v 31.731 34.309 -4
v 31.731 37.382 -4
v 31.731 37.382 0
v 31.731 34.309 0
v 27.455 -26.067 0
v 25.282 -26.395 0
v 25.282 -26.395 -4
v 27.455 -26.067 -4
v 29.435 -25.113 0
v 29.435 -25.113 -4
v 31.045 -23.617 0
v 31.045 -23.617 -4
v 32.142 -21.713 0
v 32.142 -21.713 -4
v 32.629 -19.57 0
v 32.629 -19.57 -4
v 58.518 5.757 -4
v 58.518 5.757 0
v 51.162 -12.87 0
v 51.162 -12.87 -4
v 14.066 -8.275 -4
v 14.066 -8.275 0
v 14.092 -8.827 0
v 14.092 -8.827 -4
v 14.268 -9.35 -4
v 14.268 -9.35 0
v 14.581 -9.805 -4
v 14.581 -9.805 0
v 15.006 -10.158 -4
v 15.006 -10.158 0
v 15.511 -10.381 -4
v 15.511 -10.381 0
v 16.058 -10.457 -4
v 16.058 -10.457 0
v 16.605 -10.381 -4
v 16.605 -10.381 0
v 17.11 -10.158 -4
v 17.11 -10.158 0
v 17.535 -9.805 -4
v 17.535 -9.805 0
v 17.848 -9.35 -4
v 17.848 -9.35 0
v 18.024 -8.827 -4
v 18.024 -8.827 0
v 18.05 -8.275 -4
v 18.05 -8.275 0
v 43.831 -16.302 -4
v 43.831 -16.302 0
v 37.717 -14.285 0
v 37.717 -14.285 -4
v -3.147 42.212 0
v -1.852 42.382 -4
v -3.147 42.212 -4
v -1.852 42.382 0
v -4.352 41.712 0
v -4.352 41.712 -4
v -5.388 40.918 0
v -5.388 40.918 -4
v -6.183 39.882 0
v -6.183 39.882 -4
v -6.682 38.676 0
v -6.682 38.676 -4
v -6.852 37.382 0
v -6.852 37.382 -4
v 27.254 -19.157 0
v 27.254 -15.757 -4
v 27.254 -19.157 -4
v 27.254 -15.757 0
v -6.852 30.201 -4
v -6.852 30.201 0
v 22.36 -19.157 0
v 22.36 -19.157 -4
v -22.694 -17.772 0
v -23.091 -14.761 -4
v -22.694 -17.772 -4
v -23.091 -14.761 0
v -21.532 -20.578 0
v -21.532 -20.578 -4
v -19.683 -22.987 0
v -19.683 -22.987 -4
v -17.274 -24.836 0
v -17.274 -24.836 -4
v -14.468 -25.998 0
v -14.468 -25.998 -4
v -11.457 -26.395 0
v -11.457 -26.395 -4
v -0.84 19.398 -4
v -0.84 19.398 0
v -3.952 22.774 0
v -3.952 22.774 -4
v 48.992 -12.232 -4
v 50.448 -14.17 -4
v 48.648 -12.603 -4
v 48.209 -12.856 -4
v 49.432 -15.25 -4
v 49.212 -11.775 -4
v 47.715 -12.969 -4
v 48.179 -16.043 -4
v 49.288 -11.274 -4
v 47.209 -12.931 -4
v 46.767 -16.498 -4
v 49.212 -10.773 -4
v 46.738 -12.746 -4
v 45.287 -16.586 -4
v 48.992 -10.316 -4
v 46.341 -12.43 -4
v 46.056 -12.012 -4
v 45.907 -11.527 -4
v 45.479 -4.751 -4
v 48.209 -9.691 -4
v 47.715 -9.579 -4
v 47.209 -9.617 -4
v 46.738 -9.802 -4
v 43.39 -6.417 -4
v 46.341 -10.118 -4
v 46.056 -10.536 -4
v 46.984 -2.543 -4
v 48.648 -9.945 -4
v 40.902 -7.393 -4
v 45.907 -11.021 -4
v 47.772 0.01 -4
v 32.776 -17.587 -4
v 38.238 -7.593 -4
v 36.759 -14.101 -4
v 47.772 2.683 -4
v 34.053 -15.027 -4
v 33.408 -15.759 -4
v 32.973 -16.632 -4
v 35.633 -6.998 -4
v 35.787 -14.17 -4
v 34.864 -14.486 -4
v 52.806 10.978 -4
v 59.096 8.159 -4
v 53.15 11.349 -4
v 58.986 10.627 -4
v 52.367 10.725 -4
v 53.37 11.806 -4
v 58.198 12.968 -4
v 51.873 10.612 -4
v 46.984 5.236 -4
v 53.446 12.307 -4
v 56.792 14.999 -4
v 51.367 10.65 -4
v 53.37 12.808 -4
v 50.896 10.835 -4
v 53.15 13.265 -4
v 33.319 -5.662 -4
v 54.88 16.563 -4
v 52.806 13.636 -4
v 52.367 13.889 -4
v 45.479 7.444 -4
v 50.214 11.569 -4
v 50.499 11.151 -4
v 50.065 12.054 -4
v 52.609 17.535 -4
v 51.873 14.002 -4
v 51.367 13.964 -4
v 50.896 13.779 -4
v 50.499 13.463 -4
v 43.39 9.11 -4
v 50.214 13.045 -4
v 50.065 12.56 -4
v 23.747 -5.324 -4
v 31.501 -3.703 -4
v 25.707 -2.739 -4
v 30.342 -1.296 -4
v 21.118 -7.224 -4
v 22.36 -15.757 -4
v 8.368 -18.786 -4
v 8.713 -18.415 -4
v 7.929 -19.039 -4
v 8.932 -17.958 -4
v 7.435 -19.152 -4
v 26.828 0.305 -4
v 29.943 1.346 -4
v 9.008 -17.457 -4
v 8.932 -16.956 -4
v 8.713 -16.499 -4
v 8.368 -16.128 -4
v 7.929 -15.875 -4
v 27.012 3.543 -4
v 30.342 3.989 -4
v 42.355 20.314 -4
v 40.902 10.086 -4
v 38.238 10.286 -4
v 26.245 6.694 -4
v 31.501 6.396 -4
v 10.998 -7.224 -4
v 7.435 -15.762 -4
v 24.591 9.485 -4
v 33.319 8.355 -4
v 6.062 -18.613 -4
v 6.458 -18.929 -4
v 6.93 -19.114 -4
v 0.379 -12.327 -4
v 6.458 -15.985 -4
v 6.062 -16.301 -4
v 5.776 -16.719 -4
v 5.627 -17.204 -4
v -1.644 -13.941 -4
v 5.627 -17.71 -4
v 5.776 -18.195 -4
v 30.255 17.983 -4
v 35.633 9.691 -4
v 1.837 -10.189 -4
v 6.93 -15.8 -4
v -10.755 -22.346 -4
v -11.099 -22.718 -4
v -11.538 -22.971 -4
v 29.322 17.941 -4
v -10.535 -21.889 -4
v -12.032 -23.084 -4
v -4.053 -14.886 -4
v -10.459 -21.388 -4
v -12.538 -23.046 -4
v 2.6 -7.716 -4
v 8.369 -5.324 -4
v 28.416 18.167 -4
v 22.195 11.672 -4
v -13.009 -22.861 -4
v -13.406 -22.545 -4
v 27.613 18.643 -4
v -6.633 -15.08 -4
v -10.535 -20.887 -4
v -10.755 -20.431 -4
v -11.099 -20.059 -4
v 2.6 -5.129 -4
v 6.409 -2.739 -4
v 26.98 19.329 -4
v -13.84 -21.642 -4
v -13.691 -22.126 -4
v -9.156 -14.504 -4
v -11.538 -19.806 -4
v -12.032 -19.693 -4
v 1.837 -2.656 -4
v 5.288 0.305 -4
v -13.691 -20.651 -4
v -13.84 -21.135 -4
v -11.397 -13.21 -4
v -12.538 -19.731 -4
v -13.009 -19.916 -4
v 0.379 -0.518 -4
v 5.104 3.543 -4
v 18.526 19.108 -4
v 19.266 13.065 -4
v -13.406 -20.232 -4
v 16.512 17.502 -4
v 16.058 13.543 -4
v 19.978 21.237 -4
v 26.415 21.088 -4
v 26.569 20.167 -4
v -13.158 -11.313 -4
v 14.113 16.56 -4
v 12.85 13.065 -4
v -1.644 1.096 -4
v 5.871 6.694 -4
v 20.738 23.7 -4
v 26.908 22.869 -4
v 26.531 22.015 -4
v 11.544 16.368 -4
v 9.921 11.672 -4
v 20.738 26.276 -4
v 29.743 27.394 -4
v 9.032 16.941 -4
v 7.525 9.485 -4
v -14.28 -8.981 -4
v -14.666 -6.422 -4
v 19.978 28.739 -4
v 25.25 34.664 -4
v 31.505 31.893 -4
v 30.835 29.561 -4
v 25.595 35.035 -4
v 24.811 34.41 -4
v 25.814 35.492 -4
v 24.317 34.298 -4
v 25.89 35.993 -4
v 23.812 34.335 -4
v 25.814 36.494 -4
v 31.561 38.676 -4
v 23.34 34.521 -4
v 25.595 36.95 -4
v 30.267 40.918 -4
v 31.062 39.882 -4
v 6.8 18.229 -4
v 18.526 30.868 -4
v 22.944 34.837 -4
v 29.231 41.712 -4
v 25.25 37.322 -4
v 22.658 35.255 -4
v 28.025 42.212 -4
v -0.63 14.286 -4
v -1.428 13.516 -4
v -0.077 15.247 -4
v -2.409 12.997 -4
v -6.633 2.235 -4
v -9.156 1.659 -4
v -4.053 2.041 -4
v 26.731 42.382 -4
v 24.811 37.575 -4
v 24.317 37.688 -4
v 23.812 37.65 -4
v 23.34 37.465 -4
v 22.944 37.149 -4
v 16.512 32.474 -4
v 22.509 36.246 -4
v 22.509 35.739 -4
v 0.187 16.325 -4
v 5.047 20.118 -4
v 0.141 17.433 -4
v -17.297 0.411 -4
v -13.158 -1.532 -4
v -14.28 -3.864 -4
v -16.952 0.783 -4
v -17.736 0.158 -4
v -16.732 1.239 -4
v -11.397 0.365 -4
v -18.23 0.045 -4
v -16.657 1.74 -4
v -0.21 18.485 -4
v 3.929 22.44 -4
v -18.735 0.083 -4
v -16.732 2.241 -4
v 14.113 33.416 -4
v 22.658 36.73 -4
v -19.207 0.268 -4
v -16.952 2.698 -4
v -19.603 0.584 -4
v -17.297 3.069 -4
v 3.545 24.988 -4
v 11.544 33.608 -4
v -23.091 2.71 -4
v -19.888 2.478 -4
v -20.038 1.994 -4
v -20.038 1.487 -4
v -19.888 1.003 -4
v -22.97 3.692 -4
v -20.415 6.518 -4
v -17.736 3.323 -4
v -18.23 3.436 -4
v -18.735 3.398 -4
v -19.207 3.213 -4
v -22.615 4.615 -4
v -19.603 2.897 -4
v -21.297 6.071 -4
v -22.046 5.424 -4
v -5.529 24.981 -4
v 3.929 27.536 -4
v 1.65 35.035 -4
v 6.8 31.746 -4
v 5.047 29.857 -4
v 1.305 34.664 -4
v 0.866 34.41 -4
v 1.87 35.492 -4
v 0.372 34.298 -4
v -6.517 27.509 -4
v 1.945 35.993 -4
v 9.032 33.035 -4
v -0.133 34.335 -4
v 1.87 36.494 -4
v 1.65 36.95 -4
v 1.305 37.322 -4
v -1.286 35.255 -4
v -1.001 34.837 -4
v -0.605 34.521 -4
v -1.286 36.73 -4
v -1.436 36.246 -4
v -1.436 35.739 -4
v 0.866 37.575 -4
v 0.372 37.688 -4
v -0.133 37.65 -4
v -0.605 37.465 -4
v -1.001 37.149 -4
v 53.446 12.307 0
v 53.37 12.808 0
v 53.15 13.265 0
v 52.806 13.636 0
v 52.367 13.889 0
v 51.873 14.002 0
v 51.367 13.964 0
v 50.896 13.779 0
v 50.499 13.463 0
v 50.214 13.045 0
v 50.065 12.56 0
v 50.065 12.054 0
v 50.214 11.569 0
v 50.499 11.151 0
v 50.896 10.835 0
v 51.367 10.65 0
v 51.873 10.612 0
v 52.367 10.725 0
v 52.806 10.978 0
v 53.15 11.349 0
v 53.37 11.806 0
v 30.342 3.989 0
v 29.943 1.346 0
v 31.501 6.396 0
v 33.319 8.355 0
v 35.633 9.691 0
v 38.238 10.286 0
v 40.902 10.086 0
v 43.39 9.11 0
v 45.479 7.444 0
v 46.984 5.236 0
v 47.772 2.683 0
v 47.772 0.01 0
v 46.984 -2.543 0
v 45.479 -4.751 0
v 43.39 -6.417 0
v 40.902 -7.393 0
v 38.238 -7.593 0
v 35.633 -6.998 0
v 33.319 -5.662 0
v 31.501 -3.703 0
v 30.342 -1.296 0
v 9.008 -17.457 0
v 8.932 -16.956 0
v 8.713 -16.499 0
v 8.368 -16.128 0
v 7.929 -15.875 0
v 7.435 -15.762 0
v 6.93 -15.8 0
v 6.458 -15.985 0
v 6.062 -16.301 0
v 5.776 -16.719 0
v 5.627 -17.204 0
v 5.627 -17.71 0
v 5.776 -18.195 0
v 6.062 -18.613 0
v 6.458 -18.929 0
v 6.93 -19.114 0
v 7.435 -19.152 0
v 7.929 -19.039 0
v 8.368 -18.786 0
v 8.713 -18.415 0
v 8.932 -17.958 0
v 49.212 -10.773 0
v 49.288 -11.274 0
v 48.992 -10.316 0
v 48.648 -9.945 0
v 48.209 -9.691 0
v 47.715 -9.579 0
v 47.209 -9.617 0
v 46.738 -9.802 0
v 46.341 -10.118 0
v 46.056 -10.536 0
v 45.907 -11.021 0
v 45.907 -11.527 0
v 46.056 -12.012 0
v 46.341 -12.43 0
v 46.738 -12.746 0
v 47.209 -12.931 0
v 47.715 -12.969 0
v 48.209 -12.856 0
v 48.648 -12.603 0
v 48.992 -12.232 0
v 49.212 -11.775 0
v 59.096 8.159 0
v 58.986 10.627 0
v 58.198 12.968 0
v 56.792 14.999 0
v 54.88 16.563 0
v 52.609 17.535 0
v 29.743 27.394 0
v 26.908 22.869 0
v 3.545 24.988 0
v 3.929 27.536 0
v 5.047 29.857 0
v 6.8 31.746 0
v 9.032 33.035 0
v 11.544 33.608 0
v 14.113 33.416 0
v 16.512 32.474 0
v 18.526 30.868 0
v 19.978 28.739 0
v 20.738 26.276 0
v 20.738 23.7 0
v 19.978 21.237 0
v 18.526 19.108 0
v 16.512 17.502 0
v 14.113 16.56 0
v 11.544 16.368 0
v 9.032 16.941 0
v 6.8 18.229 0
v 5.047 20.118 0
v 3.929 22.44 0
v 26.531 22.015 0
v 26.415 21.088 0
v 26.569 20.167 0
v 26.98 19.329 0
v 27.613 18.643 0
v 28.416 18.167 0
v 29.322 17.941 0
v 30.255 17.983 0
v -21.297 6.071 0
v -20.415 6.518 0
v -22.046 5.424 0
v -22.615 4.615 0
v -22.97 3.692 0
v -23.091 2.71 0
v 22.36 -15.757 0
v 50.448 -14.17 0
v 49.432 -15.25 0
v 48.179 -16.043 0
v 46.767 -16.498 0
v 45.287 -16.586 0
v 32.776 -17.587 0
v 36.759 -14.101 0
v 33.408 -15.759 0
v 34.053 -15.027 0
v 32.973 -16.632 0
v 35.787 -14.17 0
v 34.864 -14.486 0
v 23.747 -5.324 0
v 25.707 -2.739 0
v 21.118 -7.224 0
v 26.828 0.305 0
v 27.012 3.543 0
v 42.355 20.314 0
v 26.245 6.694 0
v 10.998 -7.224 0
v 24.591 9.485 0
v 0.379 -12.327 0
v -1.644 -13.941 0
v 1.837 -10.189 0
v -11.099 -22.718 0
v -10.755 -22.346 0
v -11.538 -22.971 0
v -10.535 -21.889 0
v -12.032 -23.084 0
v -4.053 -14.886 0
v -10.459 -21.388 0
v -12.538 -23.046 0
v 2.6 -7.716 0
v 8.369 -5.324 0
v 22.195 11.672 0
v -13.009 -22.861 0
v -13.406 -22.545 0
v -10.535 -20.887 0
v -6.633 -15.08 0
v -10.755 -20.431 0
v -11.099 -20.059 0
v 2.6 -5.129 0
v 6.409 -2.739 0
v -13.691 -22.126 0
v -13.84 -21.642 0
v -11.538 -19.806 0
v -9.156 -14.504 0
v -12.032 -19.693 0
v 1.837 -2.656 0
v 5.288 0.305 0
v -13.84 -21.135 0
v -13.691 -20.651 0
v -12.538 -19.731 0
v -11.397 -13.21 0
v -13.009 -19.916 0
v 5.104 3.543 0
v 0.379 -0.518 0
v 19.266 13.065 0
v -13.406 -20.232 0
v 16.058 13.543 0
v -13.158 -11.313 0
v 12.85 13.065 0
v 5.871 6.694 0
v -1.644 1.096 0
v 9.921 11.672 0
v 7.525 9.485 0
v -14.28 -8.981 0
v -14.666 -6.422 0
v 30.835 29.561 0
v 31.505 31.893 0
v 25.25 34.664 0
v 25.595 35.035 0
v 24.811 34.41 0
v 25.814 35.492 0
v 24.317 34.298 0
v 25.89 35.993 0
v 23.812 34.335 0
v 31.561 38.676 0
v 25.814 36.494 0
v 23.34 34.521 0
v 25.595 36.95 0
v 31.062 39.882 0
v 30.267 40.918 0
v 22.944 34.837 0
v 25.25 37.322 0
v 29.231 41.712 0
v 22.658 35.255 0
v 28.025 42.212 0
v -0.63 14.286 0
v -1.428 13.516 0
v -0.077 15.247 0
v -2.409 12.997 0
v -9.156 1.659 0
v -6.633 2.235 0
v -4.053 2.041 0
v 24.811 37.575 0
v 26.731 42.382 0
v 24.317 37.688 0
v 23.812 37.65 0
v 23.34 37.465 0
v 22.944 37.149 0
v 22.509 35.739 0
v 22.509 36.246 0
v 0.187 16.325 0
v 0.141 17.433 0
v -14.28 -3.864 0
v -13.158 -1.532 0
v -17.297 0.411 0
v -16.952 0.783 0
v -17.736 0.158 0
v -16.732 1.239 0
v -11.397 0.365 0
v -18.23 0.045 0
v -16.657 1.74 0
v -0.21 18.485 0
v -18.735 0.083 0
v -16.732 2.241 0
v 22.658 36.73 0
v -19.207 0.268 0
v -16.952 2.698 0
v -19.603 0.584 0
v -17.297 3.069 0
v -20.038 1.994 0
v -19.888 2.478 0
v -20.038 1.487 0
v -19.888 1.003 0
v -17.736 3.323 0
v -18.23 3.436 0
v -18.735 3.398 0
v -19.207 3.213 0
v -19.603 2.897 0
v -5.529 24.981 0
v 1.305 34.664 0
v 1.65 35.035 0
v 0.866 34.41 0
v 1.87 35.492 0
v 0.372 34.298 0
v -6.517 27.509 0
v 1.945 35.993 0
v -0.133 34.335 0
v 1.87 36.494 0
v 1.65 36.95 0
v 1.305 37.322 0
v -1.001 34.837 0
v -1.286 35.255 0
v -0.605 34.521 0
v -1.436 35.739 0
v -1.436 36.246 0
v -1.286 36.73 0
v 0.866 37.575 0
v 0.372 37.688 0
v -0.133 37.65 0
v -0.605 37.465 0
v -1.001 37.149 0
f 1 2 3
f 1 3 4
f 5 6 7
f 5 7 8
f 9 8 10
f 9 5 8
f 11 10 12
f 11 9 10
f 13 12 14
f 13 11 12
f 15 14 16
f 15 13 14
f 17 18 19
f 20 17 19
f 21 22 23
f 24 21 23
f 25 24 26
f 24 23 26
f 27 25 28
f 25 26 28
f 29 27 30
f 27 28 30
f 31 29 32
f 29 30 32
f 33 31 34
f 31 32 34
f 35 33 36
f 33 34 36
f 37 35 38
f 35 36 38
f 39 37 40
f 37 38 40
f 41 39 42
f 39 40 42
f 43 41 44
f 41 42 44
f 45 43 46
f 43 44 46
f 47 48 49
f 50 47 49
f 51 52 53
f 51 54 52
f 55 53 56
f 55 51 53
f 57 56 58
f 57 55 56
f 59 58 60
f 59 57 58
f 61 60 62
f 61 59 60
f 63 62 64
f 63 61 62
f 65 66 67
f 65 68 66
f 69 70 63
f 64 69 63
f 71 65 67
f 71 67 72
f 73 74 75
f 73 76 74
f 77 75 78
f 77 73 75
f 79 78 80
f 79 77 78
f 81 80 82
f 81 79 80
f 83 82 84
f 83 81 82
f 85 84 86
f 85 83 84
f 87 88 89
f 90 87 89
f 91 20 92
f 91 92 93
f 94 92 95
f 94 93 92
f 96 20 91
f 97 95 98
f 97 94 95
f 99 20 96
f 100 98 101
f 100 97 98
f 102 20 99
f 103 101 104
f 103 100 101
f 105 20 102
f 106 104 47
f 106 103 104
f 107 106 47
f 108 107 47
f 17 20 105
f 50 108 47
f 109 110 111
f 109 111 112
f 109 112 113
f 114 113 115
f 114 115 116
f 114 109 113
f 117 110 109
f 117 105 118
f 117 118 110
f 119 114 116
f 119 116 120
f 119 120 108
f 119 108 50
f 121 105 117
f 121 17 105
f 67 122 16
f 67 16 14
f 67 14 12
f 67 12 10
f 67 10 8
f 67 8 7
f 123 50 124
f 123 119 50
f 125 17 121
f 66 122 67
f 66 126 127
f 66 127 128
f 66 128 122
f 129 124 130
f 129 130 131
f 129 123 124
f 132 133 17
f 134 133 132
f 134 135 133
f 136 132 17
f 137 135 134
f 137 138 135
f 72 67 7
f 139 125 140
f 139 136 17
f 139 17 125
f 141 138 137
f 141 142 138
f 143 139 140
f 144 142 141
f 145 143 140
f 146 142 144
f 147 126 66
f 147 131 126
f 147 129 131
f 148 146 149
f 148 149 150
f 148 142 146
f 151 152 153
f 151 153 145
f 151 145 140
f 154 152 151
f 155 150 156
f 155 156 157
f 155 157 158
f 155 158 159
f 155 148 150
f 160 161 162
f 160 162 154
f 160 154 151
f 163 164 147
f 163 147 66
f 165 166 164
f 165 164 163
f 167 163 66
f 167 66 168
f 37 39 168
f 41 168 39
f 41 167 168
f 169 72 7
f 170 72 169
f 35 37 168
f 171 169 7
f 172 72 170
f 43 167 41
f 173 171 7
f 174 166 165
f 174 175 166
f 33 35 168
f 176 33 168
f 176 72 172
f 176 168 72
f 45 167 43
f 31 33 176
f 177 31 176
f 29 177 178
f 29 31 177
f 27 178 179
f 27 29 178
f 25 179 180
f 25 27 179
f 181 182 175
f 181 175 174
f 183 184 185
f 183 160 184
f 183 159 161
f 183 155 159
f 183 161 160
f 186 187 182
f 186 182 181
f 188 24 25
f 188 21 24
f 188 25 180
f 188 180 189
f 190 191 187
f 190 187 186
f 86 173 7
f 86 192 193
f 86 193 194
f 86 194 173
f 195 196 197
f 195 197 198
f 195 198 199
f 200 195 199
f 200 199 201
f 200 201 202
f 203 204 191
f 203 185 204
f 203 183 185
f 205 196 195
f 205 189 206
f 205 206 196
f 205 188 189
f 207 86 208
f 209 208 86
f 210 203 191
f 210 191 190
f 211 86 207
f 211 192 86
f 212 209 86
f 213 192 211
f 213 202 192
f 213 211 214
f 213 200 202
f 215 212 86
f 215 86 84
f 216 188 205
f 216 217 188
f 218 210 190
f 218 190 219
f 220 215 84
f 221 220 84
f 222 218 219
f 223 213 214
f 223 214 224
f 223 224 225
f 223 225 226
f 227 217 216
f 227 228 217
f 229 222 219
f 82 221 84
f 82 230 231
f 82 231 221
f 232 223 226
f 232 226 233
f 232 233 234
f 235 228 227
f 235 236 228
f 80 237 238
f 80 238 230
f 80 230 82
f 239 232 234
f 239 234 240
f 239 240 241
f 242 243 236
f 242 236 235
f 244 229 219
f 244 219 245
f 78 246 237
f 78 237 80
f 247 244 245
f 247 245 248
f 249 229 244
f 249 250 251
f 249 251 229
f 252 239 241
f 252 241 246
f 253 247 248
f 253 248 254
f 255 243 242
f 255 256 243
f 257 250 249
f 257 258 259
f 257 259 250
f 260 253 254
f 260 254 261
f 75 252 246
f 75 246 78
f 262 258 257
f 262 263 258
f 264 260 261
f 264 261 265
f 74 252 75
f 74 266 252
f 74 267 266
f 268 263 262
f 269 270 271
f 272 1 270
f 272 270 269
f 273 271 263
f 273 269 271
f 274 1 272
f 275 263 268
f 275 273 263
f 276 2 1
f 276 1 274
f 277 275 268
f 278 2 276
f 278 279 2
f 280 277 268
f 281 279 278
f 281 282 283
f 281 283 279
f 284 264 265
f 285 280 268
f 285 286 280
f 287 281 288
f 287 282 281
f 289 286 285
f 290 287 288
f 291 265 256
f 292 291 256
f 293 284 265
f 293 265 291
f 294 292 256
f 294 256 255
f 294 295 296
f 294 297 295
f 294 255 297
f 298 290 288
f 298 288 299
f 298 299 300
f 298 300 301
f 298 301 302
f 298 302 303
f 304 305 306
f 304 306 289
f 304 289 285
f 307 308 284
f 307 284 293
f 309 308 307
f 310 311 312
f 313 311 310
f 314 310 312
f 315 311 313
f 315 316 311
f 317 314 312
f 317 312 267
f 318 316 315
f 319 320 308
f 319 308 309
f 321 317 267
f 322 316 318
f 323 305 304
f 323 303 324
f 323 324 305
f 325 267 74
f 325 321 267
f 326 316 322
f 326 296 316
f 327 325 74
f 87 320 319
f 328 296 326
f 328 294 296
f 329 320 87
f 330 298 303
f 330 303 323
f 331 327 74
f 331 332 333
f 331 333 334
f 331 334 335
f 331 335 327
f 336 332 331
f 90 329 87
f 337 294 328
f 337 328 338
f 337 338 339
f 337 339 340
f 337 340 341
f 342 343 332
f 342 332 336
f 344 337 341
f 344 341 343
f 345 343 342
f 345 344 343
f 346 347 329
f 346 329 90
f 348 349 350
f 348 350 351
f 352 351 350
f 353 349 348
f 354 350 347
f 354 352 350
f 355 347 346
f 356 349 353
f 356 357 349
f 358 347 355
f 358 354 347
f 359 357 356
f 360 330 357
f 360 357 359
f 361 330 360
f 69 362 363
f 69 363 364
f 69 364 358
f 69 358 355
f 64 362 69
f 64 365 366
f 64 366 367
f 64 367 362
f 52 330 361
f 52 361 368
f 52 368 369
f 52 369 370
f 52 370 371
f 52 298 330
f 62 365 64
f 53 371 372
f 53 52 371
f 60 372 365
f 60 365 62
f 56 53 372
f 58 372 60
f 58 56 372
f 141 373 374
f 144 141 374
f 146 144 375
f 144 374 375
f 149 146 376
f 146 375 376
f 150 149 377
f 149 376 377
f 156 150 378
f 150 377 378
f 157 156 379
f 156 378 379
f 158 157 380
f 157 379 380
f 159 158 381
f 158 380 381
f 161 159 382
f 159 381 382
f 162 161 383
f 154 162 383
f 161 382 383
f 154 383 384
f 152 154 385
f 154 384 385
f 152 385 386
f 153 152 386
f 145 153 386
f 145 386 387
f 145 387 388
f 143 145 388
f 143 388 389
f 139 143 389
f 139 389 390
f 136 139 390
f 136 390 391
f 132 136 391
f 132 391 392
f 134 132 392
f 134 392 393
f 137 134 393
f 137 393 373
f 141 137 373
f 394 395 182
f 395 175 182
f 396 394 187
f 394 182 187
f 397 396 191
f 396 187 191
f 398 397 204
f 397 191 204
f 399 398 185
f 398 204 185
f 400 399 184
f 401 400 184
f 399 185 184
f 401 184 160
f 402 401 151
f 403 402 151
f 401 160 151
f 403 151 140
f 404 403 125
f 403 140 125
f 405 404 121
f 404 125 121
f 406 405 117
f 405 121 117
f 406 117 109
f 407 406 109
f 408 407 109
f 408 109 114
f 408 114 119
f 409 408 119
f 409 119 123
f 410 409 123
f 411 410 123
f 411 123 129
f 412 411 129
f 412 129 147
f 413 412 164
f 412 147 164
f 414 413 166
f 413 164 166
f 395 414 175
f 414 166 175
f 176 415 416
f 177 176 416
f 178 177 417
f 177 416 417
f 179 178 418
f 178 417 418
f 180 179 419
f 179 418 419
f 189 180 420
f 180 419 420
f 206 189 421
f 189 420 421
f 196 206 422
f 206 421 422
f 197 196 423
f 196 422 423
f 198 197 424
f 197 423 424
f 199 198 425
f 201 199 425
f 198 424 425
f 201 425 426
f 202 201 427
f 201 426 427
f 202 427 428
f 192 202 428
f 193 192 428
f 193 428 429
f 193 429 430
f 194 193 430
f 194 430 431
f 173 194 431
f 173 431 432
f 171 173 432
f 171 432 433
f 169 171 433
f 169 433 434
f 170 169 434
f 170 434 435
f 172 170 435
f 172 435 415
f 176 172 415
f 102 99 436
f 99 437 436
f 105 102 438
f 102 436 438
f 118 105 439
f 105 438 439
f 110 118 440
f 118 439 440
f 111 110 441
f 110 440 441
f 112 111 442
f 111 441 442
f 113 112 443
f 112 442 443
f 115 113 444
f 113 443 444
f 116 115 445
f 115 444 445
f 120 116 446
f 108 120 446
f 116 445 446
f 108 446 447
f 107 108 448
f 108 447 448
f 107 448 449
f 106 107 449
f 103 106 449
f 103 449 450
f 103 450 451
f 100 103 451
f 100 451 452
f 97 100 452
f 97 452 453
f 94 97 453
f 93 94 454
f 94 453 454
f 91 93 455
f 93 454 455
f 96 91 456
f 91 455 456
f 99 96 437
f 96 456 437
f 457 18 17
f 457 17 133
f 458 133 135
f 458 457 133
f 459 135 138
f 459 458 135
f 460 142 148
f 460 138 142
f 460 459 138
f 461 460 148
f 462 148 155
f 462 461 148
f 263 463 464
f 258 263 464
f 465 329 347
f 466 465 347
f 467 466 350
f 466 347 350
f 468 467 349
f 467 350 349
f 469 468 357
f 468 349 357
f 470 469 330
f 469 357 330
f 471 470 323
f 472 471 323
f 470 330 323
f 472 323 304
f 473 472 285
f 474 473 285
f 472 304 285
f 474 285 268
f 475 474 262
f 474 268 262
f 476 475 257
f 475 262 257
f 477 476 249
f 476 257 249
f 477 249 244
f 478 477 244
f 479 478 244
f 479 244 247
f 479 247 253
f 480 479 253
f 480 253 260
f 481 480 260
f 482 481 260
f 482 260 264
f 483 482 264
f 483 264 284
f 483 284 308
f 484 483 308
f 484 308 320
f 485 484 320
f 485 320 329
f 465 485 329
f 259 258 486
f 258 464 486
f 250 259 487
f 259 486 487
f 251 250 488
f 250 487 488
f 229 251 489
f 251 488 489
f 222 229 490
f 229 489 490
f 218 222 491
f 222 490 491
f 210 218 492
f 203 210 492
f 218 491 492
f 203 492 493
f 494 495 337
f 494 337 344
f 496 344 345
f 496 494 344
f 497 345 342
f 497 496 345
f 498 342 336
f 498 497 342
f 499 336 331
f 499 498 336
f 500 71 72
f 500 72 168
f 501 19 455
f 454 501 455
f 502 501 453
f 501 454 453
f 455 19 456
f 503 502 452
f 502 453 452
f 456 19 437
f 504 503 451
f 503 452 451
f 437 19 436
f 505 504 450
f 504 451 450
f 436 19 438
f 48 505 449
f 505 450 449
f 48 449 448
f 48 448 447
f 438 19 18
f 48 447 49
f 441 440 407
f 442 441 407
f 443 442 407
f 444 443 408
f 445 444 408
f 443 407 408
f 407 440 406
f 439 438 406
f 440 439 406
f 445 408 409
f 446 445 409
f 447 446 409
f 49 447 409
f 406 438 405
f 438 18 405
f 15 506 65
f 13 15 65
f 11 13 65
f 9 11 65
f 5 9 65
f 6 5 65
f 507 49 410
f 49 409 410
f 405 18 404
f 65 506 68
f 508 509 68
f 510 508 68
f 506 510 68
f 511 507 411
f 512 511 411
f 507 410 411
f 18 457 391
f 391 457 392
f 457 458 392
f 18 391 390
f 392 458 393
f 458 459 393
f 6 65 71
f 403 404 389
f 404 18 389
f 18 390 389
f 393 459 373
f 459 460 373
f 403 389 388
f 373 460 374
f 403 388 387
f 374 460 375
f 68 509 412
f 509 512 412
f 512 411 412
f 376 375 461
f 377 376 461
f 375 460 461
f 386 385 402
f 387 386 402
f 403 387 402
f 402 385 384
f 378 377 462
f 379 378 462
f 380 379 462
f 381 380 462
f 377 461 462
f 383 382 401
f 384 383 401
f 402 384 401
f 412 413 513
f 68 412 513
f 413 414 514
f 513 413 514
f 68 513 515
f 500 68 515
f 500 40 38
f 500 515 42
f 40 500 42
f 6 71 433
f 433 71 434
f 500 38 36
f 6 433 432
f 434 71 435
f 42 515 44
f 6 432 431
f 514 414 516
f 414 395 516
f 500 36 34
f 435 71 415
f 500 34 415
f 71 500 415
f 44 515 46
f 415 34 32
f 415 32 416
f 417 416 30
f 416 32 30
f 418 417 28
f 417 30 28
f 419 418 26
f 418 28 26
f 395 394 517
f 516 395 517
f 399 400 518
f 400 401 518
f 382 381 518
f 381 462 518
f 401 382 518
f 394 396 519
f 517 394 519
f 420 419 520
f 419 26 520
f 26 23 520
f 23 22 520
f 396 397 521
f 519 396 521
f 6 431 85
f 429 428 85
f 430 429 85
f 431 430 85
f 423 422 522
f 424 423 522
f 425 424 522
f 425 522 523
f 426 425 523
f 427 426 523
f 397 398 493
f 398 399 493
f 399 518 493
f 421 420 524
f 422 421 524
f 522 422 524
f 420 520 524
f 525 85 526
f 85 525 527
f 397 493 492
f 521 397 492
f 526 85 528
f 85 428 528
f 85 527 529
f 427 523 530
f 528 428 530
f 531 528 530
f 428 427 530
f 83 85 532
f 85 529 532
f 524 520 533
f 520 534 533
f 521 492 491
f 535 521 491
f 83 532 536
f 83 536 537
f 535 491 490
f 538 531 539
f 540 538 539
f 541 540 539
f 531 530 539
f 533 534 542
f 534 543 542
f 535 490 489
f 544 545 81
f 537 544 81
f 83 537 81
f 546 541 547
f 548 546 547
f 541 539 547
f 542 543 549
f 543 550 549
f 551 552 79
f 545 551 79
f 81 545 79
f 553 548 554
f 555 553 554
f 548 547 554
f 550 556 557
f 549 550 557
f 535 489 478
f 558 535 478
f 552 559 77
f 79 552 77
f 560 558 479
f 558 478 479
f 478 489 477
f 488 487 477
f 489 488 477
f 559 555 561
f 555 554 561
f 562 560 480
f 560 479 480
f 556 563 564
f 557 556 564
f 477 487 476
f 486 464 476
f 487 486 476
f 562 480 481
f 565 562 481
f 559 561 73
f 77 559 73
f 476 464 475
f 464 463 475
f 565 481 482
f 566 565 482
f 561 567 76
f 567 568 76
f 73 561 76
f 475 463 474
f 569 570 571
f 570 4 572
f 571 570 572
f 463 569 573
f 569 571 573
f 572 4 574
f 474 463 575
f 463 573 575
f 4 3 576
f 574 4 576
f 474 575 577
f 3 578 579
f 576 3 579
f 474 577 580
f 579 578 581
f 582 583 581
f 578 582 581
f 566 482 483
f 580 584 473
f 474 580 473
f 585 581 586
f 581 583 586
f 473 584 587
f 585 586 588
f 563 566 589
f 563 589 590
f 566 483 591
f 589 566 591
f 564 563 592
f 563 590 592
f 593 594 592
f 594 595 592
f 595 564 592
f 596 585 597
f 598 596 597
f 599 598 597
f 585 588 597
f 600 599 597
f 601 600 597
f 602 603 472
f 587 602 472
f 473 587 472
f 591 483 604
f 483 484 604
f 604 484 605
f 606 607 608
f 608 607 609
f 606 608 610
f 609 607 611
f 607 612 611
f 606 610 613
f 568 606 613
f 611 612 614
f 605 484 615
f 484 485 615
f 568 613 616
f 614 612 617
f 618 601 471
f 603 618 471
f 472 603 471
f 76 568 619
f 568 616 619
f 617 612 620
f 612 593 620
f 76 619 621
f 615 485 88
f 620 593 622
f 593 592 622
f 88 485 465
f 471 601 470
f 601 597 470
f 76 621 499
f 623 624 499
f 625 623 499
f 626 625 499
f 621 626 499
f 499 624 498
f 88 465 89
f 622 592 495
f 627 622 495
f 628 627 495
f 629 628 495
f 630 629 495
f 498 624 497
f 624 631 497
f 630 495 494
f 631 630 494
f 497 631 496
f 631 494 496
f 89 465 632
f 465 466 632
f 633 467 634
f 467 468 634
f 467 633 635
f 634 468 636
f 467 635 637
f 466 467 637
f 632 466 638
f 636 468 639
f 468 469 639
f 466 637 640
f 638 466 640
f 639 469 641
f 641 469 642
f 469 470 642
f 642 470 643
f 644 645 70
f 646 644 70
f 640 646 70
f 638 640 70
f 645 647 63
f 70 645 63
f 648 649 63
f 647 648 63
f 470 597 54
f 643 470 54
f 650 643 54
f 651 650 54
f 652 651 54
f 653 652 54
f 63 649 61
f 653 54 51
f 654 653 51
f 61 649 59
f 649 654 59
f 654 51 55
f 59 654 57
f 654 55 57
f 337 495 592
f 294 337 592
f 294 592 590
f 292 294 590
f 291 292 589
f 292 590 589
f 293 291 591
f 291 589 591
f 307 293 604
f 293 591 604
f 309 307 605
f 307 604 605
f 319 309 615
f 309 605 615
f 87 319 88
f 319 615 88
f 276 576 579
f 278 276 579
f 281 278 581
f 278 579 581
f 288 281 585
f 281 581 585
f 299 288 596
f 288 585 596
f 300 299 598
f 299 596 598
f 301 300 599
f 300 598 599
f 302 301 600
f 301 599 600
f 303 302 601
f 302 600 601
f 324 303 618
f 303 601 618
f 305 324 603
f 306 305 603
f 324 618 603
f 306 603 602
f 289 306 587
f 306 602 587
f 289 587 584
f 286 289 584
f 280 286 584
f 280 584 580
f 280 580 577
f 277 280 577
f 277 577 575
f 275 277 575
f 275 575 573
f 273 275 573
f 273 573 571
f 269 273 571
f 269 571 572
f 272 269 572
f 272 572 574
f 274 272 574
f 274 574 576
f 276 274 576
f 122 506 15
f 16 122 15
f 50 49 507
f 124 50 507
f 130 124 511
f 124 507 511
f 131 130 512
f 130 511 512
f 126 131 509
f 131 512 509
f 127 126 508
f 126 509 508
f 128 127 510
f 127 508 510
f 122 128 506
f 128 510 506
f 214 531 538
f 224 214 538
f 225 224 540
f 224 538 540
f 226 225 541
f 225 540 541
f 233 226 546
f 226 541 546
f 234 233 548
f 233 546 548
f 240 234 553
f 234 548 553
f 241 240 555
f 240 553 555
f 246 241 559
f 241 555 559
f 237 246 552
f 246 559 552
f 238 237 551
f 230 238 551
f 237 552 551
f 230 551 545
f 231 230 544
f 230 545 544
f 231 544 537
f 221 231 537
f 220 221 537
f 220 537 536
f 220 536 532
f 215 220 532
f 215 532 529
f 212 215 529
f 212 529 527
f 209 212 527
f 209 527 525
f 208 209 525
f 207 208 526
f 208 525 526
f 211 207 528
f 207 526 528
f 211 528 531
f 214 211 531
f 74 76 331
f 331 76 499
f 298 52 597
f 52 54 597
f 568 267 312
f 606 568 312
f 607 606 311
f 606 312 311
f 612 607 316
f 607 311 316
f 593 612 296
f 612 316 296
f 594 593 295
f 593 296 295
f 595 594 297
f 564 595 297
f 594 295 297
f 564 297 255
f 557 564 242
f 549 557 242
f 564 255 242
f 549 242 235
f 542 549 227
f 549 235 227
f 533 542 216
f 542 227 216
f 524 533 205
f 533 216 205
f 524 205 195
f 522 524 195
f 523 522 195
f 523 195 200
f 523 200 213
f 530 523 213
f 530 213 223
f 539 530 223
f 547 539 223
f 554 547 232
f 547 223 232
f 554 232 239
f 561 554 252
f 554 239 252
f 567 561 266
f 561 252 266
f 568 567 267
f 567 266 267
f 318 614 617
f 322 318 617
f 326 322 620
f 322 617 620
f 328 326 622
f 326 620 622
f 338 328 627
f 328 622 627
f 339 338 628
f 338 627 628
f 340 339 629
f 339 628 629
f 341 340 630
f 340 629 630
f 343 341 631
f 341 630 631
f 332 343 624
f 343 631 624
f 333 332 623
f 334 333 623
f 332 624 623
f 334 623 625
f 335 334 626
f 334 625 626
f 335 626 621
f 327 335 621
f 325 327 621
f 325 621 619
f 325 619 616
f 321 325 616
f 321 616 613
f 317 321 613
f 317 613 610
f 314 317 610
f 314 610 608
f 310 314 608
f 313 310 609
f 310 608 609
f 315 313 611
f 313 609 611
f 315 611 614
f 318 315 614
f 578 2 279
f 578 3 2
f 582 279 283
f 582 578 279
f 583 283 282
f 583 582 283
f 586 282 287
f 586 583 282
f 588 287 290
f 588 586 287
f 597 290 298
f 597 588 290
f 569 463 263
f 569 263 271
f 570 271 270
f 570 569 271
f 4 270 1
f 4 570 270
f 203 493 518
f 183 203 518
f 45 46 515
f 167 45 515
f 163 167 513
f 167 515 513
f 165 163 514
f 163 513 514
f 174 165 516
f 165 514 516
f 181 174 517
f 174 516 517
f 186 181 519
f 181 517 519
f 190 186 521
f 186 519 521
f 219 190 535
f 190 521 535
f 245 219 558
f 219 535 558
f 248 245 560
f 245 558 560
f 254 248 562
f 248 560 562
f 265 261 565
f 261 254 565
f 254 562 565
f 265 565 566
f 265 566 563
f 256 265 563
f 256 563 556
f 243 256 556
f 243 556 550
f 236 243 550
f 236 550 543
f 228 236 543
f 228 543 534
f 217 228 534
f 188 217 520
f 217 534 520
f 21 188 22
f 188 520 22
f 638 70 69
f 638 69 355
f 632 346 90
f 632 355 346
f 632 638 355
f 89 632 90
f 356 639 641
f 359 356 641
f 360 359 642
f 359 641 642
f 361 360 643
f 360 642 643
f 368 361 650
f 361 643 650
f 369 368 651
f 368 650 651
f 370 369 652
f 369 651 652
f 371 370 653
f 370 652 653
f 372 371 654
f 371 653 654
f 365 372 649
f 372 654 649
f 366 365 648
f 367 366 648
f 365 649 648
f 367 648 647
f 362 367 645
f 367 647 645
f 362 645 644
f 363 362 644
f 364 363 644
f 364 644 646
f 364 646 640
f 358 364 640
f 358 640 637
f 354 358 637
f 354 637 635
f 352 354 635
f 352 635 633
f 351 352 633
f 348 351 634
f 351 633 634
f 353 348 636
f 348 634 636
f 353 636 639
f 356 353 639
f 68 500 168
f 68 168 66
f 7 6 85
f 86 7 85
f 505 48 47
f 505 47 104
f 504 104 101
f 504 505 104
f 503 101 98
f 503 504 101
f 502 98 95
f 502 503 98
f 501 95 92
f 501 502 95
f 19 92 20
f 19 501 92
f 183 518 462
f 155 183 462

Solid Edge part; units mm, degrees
sketch "Sketch1" plane through (0, 0, 0) normal (0, 0, 1) x (1, 0, 0)
  arc A0 (-6.8525, 37.382) -> (-1.8525, 42.382) centre (-1.8525, 37.382) cw
  line L0 (-1.8525, 42.382) -> (26.7314, 42.382)
  arc A1 (26.7314, 42.382) -> (31.7314, 37.382) centre (26.7314, 37.382) cw
  line L1 (31.7314, 37.382) -> (31.7314, 34.309)
  arc A2 (31.7314, 34.309) -> (29.7434, 27.3935) centre (18.7097, 34.309) cw
  line L2 (29.7434, 27.3935) -> (26.9077, 22.8691)
  arc A3 (26.9077, 22.8691) -> (30.2548, 17.9831) centre (29.644, 21.1541) ccw
  line L3 (30.2548, 17.9831) -> (42.3551, 20.3139)
  line L4 (42.3551, 20.3139) -> (52.609, 17.5355)
  arc A4 (52.609, 17.5355) -> (58.5185, 5.7573) centre (50.2974, 9.0041) cw
  line L5 (58.5185, 5.7573) -> (51.162, -12.8695)
  arc A5 (51.162, -12.8695) -> (43.8308, -16.3025) centre (45.6786, -10.7039) cw
  line L6 (43.8308, -16.3025) -> (37.7171, -14.2847)
  arc A6 (37.7171, -14.2847) -> (32.7758, -17.5867) centre (36.5355, -17.8647) ccw
  line L7 (32.7758, -17.5867) -> (32.6292, -19.5705)
  arc A7 (32.6292, -19.5705) -> (25.2819, -26.3946) centre (25.2819, -19.0273) cw
  line L8 (25.2819, -26.3946) -> (-11.457, -26.3946)
  arc A8 (-11.457, -26.3946) -> (-23.0909, -14.7608) centre (-11.457, -14.7608) cw
  line L9 (-23.0909, -14.7608) -> (-23.0909, 2.7102)
  arc A9 (-23.0909, 2.7102) -> (-20.4146, 6.5177) centre (-19.0444, 2.7102) cw
  line L10 (-20.4146, 6.5177) -> (-2.4086, 12.9973)
  arc A10 (-2.4086, 12.9973) -> (-0.84, 19.3976) centre (-3.7474, 16.7178) ccw
  line L11 (-0.84, 19.3976) -> (-3.9517, 22.7738)
  arc A11 (-3.9517, 22.7738) -> (-6.8525, 30.201) centre (4.1066, 30.201) cw
  line L12 (-6.8525, 30.201) -> (-6.8525, 37.382)
  circle A12 centre (7.308, -17.457) radius 1.7
  arc A13 (18.0497, -8.2752) -> (14.0663, -8.2752) centre (16.058, -8.457) cw
  arc A14 (14.0663, -8.2752) -> (18.0497, -8.2752) centre (16.058, 2.543) cw
  circle A15 centre (24.1899, 35.9928) radius 1.7
  circle A16 centre (0.2453, 35.9928) radius 1.7
  line L13 (27.2537, -19.157) -> (22.3605, -19.157)
  line L14 (27.2537, -15.757) -> (27.2537, -19.157)
  line L15 (22.3605, -15.757) -> (27.2537, -15.757)
  line L16 (22.3605, -19.157) -> (22.3605, -15.757)
  circle A17 centre (-18.3568, 1.7403) radius 1.7
  circle A18 centre (-12.1594, -21.3884) radius 1.7
  circle A19 centre (47.5876, -11.2739) radius 1.7
  circle A20 centre (51.7456, 12.307) radius 1.7
extrude "Protrusion1" add sketch "Sketch1" against normal blind 4
sketch "Sketch2" plane through (18.0228, 7.9937, -4) normal (0, 0, -1) x (-1, 0, 0)
  circle A0 centre (5.8331, 16.9942) radius 8.6444
  circle A1 centre (24.0074, -14.4162) radius 8.6815
  circle A2 centre (-20.8849, -6.6472) radius 8.9643
extrude "Cutout1" cut sketch "Sketch2" against normal up to next
